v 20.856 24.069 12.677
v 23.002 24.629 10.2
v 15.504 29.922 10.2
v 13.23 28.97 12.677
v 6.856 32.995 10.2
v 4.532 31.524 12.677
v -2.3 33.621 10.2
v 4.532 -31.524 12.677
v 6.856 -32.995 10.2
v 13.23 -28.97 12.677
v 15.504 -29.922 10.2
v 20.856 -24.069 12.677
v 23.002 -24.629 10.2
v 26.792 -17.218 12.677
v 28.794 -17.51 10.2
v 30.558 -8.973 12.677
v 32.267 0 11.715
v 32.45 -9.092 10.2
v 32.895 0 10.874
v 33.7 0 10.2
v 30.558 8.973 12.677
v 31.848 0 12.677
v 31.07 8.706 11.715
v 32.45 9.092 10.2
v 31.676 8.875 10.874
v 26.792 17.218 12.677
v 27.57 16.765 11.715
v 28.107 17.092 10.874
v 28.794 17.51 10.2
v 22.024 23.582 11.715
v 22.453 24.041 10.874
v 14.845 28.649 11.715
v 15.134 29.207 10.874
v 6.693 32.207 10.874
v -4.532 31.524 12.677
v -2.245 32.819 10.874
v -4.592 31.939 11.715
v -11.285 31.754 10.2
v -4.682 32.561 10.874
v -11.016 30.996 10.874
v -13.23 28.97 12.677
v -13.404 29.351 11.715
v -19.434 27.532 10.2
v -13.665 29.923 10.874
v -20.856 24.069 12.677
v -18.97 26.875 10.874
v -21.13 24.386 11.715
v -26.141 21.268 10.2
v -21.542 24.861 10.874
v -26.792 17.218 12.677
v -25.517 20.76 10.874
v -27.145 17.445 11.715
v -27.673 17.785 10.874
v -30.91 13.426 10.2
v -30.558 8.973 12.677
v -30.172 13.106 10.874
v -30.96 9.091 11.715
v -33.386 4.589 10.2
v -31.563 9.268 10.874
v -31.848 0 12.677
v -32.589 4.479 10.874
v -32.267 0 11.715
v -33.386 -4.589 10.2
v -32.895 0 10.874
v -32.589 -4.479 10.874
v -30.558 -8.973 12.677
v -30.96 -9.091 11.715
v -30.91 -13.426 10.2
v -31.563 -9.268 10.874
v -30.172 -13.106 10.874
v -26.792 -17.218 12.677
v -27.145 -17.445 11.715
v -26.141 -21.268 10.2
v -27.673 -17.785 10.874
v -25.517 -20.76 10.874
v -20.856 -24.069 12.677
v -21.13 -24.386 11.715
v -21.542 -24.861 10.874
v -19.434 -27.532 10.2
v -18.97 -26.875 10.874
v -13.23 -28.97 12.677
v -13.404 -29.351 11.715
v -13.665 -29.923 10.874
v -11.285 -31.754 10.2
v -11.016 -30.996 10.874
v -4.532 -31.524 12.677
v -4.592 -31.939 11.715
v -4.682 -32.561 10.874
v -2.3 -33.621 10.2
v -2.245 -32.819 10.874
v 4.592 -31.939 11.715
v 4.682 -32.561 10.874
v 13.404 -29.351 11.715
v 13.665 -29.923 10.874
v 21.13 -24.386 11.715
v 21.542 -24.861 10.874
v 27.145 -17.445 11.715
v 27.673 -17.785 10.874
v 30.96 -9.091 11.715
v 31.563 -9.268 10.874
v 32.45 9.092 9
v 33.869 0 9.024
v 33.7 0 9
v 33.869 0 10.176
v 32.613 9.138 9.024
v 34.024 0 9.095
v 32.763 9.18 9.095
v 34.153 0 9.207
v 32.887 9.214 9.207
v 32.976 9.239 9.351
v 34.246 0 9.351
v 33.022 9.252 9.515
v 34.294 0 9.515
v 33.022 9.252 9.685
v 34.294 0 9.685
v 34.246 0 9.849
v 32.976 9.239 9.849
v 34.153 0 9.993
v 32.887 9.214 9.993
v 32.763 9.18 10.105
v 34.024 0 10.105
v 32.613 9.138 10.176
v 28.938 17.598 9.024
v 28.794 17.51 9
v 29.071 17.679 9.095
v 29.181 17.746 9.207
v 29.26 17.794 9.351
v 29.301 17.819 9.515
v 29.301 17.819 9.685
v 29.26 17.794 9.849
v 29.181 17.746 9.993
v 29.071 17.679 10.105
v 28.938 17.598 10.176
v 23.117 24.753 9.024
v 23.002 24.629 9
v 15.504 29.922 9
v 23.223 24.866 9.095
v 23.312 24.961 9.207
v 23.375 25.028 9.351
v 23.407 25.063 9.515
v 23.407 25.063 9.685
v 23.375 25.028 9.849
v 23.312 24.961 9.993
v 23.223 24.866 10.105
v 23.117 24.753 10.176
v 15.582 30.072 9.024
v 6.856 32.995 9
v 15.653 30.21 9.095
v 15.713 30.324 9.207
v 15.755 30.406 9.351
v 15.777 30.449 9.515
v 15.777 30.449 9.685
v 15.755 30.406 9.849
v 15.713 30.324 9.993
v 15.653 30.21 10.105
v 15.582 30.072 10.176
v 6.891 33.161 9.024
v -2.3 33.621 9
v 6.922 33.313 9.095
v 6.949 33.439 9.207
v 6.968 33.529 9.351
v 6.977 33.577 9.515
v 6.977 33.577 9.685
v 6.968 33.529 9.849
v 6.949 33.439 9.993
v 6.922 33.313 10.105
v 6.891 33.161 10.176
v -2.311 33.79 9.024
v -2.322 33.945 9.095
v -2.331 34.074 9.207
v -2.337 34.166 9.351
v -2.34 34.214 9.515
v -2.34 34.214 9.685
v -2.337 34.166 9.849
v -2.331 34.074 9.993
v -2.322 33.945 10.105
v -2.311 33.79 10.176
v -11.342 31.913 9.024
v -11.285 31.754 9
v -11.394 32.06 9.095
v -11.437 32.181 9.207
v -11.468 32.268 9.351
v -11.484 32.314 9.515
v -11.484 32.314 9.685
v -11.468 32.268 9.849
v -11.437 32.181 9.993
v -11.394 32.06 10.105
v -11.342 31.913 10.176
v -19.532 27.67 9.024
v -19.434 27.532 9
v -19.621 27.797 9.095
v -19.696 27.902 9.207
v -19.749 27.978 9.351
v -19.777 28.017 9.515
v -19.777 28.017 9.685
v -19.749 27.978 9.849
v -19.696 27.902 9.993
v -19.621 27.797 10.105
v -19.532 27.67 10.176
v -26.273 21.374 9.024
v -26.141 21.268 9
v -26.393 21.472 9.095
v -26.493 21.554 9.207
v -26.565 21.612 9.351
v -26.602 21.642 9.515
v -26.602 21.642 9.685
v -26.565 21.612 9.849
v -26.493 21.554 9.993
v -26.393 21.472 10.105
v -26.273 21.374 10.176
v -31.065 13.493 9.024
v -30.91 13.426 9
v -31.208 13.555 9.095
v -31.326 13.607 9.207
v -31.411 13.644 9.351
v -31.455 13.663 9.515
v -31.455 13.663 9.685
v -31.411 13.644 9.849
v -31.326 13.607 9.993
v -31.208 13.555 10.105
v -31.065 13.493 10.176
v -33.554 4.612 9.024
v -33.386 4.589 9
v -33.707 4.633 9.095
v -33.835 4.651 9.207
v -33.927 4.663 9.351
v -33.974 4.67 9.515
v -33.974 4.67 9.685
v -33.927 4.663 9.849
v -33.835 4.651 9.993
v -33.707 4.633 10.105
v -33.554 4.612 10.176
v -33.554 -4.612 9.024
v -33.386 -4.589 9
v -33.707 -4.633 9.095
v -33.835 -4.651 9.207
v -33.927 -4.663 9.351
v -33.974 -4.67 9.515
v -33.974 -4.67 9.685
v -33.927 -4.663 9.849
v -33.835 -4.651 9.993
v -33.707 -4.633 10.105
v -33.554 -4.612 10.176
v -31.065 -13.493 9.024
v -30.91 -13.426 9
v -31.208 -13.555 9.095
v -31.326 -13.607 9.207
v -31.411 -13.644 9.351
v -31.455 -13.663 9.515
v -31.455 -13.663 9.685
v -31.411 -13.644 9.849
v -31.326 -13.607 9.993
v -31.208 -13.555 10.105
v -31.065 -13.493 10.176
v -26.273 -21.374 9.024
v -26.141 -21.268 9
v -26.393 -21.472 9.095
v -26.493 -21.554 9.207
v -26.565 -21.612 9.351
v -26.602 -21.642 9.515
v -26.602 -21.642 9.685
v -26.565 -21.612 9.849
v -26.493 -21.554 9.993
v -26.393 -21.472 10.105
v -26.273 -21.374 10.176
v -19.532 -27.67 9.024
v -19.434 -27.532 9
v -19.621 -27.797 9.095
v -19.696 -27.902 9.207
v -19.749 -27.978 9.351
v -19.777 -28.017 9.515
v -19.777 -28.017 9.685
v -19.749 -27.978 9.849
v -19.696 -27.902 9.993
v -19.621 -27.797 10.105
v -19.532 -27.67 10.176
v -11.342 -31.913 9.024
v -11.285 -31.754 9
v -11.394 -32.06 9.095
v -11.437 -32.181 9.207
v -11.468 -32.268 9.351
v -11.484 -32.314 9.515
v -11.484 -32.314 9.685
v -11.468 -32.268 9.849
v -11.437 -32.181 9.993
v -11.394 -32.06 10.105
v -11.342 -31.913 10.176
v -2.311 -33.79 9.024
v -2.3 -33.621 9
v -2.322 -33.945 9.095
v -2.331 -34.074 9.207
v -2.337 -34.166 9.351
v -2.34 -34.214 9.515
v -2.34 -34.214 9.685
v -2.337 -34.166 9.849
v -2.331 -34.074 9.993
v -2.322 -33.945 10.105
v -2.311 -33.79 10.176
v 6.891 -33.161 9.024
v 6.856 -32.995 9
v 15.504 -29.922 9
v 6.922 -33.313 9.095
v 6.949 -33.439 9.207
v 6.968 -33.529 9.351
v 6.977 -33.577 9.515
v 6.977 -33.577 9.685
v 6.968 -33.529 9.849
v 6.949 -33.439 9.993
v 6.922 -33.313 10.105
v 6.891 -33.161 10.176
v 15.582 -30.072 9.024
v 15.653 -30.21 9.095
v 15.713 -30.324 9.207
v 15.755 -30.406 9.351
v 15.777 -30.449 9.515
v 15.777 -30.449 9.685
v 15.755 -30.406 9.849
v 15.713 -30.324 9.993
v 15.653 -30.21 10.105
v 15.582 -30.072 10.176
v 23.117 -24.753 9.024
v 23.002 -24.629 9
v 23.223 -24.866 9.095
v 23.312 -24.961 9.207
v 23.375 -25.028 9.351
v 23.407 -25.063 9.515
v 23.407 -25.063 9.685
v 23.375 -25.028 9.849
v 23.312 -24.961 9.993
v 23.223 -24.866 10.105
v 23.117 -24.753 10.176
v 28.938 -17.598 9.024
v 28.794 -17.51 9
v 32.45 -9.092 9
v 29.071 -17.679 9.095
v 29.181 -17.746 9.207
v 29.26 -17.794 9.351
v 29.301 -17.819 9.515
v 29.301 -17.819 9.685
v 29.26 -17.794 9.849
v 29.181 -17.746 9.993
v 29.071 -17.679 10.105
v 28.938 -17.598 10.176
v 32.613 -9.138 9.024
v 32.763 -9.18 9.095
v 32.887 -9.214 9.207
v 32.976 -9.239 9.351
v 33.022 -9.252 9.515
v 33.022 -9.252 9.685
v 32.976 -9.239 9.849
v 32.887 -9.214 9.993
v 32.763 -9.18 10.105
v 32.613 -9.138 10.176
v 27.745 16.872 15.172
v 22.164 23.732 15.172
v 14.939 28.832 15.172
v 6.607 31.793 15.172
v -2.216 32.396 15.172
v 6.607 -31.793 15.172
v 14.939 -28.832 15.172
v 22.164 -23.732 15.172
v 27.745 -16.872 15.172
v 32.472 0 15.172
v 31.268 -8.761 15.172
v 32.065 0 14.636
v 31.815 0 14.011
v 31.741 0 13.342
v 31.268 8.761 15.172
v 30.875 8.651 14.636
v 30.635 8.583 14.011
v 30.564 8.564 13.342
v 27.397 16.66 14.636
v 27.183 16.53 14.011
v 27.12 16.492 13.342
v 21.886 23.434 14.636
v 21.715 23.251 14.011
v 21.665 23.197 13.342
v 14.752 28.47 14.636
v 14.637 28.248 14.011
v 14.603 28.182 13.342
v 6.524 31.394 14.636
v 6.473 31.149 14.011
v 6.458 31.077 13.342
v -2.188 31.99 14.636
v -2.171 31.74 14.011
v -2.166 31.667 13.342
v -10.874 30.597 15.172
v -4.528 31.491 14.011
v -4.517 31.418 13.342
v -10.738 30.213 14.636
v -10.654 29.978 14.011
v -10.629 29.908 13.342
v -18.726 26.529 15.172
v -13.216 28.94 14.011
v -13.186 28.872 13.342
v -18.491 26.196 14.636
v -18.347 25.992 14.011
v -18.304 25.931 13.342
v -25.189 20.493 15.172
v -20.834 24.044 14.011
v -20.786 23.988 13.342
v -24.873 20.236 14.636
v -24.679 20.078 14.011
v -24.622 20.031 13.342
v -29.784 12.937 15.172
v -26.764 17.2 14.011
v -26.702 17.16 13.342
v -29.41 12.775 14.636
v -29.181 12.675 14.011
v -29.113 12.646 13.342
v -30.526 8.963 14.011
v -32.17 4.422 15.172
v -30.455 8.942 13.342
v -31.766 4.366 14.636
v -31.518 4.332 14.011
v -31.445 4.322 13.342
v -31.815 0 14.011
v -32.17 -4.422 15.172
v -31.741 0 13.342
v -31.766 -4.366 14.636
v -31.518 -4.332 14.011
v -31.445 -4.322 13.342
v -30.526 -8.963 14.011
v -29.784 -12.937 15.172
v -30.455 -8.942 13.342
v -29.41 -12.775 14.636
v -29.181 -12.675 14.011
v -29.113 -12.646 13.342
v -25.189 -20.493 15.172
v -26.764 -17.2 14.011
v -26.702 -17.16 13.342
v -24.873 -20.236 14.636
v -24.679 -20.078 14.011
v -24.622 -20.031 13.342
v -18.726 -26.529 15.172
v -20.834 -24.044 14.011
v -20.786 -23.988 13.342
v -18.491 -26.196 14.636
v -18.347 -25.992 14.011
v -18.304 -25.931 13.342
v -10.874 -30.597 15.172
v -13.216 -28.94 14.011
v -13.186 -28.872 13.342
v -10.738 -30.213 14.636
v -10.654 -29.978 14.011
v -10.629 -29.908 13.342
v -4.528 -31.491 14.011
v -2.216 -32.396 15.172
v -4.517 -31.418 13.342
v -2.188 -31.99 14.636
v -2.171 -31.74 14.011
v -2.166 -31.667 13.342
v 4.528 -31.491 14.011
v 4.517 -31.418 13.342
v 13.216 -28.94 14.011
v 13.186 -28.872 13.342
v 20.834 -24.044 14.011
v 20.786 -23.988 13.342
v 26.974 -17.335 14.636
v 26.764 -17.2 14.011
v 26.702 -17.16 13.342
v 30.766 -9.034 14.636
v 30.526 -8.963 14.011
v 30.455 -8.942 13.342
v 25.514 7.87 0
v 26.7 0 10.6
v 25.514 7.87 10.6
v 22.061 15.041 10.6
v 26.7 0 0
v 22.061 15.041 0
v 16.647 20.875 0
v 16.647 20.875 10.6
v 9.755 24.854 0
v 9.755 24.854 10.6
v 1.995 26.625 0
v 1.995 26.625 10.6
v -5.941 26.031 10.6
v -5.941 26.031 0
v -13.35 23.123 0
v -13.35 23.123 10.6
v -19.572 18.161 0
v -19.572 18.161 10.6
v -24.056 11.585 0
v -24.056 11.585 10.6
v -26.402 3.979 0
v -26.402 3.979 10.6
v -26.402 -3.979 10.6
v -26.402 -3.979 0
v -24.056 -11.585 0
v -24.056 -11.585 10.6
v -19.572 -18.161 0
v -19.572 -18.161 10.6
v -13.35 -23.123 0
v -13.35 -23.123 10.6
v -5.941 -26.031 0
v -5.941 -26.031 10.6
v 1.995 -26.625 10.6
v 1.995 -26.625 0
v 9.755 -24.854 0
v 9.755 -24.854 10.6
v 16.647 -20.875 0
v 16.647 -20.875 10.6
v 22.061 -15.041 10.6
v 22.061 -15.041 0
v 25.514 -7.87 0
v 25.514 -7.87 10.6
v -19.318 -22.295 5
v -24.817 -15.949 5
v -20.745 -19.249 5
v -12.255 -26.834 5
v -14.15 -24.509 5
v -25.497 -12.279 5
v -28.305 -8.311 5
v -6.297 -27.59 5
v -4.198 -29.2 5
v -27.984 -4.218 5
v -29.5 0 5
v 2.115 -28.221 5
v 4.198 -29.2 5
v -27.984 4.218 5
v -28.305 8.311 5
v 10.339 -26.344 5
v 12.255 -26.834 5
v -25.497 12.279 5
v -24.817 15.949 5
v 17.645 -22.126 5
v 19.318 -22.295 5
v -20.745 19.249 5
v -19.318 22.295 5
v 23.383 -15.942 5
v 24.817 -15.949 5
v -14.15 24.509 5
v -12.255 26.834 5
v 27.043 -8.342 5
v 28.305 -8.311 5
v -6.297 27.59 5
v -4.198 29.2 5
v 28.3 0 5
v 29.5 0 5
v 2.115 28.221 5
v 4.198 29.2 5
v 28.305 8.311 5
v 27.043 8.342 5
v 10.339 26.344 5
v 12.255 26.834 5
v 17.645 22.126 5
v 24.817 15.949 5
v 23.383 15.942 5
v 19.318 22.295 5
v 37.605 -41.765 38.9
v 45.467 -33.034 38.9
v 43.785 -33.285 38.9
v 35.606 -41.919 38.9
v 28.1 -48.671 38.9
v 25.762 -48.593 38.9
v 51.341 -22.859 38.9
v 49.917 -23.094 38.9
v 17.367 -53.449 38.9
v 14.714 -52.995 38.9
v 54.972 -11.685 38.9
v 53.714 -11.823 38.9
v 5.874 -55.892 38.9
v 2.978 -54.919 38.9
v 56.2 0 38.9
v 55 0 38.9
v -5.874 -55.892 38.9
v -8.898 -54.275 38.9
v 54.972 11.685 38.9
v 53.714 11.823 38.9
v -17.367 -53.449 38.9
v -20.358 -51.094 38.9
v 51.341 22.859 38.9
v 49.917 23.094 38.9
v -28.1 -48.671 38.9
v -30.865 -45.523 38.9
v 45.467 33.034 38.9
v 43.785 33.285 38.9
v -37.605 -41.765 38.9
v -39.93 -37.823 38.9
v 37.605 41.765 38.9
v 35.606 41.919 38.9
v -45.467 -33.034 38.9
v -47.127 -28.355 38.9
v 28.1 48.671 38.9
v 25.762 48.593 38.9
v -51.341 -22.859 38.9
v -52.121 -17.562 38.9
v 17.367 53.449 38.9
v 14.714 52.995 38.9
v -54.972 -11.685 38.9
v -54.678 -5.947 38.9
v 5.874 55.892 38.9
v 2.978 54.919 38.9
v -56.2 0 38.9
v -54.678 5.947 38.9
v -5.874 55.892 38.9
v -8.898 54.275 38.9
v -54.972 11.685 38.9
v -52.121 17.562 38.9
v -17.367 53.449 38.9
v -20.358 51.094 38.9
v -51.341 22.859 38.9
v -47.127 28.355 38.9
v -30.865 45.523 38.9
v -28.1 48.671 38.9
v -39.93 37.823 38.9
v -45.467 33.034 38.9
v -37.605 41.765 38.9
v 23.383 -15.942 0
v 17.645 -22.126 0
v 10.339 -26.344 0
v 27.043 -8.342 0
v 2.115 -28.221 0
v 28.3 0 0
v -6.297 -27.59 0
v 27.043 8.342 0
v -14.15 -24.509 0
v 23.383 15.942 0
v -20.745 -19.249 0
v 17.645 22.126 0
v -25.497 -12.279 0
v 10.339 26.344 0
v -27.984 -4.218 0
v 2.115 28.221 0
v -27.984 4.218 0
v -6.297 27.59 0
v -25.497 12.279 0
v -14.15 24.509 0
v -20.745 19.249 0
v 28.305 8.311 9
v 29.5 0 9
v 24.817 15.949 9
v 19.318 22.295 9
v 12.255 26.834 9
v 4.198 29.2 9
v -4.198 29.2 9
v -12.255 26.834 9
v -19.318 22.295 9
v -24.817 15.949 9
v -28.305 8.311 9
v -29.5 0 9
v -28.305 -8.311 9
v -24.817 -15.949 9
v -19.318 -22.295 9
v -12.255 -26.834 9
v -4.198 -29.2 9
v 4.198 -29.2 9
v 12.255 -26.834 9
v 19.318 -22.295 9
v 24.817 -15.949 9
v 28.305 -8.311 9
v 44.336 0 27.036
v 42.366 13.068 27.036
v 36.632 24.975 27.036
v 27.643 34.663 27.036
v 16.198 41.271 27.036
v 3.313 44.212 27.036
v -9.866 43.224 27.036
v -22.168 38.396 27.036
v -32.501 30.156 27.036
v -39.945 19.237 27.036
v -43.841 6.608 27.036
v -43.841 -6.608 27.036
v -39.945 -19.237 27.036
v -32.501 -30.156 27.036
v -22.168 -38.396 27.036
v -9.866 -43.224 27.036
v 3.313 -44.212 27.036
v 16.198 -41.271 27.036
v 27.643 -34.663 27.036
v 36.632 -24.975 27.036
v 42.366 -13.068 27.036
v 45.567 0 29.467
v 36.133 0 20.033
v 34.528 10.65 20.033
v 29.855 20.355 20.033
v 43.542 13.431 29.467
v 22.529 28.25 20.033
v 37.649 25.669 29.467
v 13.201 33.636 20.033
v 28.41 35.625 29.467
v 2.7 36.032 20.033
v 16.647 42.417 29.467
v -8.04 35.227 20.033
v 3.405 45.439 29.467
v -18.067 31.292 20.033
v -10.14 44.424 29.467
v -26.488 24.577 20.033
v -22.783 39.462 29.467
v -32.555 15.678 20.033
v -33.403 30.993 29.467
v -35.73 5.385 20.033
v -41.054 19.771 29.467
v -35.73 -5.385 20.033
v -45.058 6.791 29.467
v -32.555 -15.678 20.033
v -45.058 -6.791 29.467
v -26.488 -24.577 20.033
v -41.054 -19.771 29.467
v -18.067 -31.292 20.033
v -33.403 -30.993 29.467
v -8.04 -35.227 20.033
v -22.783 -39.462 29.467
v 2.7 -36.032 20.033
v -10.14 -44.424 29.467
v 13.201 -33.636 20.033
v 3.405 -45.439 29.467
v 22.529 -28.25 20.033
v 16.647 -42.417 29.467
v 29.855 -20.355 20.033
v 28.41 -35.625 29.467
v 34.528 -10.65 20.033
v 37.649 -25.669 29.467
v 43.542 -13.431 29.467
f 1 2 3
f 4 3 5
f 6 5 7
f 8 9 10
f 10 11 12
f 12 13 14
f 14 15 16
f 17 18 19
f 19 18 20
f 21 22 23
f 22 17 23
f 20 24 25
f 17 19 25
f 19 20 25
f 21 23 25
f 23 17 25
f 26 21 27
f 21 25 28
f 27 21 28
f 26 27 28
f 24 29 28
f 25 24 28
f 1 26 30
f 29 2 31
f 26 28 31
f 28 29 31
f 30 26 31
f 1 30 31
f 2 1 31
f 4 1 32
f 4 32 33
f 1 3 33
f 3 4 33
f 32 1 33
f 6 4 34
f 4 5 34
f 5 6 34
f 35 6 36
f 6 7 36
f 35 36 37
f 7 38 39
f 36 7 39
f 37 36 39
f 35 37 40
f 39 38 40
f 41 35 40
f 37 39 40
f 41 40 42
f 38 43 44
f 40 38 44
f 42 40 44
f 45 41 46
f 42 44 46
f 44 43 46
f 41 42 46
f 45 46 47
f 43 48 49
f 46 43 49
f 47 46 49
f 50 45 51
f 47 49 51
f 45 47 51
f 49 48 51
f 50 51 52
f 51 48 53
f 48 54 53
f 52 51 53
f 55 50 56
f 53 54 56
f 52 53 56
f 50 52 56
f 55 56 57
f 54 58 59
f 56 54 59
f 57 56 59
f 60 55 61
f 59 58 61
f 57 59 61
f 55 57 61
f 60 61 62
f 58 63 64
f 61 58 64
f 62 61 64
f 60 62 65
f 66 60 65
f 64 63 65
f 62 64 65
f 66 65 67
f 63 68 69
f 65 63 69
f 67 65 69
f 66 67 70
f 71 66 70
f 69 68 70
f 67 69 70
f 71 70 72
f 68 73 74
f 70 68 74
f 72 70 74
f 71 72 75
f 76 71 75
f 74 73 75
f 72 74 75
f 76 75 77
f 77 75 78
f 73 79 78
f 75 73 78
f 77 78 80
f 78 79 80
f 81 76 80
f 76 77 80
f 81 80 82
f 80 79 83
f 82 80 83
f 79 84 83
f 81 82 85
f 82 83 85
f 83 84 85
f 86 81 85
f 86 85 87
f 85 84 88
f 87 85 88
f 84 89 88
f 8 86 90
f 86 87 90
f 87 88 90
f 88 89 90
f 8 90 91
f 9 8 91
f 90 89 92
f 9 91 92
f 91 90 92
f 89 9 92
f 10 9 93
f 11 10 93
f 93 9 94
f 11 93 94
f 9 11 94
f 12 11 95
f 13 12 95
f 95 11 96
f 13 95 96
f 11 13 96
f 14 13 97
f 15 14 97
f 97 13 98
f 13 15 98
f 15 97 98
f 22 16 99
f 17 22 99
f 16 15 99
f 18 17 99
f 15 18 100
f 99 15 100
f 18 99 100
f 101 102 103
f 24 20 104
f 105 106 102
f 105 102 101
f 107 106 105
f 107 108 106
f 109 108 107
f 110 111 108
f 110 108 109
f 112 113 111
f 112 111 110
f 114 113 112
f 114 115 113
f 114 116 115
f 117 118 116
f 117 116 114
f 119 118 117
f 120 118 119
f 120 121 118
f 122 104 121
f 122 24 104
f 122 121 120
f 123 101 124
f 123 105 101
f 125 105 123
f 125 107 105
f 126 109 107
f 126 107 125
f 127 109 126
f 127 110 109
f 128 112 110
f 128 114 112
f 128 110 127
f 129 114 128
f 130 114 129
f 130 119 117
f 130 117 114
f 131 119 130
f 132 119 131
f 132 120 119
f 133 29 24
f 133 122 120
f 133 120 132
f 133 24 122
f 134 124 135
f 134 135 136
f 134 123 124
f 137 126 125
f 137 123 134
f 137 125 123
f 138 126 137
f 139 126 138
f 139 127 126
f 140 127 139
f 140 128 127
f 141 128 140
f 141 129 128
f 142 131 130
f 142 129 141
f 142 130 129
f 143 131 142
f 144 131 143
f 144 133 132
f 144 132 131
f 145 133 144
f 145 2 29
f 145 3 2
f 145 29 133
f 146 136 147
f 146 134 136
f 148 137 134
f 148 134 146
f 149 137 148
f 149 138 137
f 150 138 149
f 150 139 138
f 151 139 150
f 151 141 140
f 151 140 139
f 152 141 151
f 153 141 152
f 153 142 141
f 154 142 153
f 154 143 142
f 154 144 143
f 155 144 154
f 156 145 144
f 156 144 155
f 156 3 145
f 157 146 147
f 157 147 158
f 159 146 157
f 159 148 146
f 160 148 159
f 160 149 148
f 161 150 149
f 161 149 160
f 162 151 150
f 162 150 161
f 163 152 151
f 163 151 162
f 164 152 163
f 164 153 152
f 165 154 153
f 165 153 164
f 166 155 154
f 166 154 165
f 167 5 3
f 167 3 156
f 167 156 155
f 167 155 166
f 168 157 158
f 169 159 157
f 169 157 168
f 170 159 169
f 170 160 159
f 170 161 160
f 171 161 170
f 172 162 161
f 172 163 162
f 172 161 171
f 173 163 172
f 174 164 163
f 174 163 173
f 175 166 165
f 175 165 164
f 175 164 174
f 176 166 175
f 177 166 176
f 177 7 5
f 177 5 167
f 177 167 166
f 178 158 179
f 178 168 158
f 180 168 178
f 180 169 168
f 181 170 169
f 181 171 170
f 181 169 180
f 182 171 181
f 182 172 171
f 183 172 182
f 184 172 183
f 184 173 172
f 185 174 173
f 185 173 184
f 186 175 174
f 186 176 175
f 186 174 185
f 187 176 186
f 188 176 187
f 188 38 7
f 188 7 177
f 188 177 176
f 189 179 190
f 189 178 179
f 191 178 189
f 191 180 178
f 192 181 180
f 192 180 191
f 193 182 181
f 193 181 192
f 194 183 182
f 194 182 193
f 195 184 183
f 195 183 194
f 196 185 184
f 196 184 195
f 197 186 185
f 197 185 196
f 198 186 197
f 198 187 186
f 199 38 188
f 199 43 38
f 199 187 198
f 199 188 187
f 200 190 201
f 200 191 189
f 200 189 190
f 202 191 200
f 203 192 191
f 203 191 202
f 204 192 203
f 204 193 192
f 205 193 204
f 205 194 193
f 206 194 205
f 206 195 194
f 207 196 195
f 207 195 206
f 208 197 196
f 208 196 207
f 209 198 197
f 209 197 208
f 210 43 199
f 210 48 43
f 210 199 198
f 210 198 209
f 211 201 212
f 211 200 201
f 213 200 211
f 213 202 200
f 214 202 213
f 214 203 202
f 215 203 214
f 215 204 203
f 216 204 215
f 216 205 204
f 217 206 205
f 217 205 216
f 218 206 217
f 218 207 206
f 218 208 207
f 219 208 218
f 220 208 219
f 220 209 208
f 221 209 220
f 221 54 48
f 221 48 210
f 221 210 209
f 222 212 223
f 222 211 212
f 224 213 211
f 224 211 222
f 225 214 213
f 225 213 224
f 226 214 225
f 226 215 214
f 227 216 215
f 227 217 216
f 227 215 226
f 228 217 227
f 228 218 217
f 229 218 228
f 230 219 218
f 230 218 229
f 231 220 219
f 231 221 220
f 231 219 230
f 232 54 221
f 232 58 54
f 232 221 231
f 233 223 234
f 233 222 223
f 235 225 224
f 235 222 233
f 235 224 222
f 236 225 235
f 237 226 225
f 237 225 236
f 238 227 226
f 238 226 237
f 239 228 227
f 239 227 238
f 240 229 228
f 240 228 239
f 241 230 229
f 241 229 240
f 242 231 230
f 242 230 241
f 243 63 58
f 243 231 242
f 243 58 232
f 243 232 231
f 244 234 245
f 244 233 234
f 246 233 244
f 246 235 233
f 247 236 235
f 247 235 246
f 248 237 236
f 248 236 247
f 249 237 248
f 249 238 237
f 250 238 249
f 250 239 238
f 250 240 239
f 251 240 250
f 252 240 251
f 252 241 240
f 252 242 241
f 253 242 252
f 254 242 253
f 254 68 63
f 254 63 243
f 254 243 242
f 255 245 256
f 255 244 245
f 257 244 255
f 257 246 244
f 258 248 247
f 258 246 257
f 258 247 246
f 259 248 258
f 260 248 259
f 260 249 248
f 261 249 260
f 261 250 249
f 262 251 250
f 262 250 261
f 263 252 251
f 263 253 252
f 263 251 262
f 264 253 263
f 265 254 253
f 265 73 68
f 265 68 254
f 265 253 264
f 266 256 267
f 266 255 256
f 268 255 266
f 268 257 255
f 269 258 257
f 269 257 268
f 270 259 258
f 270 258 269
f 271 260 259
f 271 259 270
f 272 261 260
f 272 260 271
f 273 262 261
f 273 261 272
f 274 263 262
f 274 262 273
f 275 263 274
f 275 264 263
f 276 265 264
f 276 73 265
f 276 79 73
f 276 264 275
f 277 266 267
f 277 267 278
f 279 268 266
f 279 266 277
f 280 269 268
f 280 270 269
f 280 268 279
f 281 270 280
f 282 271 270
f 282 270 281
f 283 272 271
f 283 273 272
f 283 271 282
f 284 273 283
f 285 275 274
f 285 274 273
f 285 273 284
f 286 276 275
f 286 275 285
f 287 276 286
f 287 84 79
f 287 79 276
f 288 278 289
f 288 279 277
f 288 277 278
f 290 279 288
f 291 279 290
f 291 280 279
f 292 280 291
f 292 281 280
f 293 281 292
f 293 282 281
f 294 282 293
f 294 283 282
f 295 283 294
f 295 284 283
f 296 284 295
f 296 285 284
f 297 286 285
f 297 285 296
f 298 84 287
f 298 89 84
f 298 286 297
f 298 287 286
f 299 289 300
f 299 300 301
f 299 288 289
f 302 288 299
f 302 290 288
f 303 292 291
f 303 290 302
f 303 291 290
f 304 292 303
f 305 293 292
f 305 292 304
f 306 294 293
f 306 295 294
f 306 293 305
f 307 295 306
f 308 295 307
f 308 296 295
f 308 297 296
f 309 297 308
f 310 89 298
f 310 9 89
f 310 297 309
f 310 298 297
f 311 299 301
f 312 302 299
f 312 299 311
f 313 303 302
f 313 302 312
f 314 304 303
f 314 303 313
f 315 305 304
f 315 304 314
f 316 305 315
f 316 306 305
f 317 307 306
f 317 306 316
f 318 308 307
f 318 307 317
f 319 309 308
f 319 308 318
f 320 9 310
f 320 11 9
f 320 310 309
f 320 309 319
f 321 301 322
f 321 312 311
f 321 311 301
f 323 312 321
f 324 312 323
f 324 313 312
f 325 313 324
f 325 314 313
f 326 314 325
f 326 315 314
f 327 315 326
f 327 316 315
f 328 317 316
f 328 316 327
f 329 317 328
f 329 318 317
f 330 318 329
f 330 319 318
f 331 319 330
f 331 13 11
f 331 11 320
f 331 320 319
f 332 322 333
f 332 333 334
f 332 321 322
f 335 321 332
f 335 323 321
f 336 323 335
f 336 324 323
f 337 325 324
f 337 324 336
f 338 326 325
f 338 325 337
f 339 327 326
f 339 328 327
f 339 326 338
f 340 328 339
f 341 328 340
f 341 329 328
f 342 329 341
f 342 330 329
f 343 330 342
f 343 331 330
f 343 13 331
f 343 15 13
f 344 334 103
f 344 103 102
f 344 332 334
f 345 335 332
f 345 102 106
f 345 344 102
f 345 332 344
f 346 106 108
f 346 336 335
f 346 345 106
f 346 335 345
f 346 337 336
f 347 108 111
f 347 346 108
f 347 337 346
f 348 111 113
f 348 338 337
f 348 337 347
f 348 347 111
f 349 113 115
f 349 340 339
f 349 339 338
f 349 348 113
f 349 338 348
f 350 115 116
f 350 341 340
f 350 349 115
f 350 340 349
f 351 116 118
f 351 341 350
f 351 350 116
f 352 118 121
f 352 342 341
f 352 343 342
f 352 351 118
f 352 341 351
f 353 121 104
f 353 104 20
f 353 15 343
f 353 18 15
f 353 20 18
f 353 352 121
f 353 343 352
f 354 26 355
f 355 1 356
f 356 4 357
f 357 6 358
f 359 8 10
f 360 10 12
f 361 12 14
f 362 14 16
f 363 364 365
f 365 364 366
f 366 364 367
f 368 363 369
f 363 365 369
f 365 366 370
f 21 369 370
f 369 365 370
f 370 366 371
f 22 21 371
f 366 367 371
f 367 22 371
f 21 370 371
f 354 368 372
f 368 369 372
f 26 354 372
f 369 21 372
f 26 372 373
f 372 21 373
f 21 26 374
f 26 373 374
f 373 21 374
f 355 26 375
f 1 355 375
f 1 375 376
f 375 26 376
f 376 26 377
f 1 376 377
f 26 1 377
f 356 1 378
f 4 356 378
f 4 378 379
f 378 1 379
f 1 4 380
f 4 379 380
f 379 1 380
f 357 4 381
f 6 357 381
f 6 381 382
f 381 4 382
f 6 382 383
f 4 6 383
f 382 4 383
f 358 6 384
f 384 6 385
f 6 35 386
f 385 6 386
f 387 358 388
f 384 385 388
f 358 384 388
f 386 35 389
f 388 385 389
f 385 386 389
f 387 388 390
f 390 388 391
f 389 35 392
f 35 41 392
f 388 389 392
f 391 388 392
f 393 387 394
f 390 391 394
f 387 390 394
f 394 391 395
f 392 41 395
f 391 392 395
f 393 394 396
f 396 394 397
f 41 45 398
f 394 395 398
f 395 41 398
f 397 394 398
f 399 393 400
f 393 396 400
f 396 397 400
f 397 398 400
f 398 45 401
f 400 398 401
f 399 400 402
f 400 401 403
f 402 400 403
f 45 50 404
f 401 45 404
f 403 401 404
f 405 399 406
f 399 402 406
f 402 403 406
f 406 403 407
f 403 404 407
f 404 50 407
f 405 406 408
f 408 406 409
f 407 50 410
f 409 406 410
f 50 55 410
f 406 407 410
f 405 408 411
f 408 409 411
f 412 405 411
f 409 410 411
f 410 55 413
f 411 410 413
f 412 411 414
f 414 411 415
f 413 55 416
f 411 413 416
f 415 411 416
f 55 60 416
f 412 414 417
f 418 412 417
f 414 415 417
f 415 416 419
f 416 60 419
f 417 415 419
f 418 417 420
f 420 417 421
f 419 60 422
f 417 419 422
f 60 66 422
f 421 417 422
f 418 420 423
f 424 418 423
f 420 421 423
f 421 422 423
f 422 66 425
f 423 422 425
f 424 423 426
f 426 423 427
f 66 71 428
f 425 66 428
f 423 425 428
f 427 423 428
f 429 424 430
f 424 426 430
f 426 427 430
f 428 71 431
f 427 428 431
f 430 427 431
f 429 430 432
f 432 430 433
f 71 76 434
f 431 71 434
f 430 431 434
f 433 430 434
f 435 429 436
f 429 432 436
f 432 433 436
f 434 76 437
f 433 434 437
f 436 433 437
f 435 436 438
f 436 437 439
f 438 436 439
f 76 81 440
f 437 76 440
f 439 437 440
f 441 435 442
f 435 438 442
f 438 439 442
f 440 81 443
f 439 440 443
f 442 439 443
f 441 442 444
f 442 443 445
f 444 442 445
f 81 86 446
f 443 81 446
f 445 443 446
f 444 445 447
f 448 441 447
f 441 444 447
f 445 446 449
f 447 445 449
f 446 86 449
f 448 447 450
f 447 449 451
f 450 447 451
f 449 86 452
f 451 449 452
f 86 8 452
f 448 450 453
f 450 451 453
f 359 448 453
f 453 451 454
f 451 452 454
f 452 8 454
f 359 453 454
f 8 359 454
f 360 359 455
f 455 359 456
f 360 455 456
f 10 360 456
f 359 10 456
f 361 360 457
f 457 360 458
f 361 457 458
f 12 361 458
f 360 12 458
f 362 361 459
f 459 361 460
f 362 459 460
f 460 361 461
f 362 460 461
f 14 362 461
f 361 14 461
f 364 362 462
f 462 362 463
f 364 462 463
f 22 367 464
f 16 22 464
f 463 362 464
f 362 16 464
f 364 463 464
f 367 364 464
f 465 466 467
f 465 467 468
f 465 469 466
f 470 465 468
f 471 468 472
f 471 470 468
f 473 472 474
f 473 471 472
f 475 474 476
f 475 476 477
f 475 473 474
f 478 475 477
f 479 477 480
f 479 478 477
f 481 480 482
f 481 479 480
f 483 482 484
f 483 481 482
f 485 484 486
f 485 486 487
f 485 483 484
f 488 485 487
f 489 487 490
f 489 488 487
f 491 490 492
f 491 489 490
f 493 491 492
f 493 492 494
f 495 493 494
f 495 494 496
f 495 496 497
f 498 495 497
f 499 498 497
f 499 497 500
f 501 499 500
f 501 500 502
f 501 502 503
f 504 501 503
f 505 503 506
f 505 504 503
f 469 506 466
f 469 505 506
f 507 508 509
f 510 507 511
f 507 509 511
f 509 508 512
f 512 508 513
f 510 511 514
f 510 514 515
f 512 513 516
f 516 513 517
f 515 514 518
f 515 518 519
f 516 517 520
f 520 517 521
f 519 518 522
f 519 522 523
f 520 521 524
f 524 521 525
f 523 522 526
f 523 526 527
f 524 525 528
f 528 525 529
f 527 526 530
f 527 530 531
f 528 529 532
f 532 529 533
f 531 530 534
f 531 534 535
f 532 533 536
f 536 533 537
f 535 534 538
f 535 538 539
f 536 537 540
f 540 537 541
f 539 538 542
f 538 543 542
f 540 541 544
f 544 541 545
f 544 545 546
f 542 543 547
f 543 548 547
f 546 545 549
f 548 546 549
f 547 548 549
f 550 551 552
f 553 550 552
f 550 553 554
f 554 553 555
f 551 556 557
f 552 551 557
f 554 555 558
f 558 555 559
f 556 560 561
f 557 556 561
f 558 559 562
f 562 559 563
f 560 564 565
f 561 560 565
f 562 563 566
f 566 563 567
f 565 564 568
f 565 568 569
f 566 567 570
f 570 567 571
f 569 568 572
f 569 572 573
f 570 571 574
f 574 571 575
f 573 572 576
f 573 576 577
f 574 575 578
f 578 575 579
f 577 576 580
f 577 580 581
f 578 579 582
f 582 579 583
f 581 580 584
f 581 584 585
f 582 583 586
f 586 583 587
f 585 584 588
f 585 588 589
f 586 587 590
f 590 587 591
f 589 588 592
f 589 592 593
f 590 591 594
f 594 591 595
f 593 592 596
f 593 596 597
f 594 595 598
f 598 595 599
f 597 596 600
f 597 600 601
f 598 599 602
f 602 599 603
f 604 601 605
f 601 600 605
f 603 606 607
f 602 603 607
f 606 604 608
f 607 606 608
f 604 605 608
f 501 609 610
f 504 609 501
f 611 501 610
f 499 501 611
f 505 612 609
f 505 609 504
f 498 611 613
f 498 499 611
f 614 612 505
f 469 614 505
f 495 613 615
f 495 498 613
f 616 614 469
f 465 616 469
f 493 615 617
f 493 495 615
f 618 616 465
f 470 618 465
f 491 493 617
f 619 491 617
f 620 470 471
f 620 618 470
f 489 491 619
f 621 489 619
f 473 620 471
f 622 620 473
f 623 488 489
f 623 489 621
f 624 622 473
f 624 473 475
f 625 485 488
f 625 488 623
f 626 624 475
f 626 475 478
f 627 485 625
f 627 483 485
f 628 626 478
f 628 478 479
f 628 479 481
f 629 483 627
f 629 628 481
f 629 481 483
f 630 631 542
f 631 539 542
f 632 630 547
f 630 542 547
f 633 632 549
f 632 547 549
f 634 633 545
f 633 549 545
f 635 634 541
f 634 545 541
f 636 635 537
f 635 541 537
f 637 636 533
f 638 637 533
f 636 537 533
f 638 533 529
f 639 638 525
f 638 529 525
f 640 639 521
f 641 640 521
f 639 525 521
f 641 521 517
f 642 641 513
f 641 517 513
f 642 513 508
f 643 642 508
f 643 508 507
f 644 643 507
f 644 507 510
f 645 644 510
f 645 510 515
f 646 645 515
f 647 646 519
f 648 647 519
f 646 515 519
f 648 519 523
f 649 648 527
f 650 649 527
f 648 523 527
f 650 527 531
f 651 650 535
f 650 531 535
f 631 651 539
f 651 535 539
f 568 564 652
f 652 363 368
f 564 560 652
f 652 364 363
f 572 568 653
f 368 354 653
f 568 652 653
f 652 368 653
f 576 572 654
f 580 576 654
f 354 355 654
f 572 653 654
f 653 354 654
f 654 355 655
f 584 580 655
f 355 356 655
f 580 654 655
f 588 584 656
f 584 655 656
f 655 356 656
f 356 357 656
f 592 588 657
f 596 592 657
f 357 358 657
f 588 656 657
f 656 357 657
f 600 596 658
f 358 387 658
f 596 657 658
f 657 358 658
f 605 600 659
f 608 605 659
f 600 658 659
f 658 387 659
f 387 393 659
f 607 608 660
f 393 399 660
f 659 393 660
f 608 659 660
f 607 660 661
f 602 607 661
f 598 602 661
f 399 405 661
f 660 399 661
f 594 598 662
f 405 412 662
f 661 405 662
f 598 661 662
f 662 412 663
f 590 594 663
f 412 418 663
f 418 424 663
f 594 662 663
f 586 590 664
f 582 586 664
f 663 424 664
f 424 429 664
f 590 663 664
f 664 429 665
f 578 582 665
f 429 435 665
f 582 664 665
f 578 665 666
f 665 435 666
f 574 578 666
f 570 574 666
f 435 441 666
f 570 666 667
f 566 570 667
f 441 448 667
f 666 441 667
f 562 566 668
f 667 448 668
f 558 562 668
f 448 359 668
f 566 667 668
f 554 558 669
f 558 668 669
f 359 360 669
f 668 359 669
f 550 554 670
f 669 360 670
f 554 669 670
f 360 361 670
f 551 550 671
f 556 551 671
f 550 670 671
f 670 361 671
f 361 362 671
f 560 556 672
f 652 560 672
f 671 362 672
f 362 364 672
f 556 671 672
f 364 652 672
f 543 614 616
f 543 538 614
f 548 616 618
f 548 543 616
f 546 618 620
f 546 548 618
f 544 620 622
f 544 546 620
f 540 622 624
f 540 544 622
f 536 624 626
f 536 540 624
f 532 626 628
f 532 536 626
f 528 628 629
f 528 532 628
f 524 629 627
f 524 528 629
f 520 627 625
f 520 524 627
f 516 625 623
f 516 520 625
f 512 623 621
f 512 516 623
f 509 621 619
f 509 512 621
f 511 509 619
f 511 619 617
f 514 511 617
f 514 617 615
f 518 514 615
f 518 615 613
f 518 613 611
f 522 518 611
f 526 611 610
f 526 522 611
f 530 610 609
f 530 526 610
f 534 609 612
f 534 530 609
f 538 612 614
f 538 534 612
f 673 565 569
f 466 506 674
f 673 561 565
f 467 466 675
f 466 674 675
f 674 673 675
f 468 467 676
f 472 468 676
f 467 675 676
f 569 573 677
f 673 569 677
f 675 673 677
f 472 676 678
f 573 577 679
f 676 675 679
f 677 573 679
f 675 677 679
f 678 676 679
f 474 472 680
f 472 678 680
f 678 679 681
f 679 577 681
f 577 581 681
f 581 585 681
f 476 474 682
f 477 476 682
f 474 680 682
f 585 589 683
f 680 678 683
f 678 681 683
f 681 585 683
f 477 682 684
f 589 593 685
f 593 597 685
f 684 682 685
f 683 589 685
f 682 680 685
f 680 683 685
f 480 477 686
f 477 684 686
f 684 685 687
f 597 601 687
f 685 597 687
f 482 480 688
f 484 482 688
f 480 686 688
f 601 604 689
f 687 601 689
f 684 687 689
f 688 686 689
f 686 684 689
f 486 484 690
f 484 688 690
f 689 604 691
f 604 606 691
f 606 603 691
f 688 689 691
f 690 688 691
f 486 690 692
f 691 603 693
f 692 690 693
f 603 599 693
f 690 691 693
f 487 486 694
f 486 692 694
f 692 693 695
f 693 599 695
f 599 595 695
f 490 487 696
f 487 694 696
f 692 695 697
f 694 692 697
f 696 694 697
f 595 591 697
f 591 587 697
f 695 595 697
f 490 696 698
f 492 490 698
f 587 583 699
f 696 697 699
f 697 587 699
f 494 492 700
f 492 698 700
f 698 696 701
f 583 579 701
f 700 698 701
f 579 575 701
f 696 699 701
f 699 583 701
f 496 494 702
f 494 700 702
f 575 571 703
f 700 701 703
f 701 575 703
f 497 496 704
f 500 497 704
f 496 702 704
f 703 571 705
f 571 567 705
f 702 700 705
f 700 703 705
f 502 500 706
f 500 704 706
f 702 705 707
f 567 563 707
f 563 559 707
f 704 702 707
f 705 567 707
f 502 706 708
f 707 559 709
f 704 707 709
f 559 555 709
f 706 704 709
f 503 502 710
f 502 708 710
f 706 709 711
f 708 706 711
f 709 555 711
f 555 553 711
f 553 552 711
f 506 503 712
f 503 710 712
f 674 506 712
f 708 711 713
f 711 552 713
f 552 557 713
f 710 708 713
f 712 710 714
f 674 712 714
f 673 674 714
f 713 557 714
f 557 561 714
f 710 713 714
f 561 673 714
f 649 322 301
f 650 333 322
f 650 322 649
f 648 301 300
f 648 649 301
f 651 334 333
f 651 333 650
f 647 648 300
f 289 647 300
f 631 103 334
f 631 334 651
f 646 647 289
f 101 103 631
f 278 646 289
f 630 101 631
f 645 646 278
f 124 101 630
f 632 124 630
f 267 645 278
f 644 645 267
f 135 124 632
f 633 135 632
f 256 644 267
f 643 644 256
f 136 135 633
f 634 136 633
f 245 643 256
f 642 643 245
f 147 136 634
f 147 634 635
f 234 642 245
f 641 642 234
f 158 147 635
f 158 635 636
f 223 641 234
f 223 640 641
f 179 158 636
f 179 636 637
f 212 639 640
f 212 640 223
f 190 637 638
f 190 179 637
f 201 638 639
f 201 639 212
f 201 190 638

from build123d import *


with BuildPart() as part:
    # Sketch → Revolution (revolve)
    with BuildSketch(Plane.XZ):
        with BuildLine():
            Line((28.3, 0), (28.3, 5))
            Line((29.5, 5), (28.3, 5))
            Line((29.5, 9), (29.5, 5))
            Line((29.5, 9), (33.7, 9))
            ThreePointArc((33.7, 9), (34.3, 9.6), (33.7, 10.2))
            ThreePointArc((31.847889, 12.677454), (32.556883, 11.276455), (33.7, 10.2))
            ThreePointArc((32.472114, 15.172114), (31.814653, 14.011199), (31.847889, 12.677454))
            Line((56.2, 38.9), (32.472114, 15.172114))
            Line((55, 38.9), (56.2, 38.9))
            Line((26.7, 10.6), (55, 38.9))
            Line((26.7, 10.6), (26.7, 0))
            Line((26.7, 0), (28.3, 0))
        make_face()
    revolve(axis=Axis((0, 0, 0), (0, 0, 1)))


solid = part.part
